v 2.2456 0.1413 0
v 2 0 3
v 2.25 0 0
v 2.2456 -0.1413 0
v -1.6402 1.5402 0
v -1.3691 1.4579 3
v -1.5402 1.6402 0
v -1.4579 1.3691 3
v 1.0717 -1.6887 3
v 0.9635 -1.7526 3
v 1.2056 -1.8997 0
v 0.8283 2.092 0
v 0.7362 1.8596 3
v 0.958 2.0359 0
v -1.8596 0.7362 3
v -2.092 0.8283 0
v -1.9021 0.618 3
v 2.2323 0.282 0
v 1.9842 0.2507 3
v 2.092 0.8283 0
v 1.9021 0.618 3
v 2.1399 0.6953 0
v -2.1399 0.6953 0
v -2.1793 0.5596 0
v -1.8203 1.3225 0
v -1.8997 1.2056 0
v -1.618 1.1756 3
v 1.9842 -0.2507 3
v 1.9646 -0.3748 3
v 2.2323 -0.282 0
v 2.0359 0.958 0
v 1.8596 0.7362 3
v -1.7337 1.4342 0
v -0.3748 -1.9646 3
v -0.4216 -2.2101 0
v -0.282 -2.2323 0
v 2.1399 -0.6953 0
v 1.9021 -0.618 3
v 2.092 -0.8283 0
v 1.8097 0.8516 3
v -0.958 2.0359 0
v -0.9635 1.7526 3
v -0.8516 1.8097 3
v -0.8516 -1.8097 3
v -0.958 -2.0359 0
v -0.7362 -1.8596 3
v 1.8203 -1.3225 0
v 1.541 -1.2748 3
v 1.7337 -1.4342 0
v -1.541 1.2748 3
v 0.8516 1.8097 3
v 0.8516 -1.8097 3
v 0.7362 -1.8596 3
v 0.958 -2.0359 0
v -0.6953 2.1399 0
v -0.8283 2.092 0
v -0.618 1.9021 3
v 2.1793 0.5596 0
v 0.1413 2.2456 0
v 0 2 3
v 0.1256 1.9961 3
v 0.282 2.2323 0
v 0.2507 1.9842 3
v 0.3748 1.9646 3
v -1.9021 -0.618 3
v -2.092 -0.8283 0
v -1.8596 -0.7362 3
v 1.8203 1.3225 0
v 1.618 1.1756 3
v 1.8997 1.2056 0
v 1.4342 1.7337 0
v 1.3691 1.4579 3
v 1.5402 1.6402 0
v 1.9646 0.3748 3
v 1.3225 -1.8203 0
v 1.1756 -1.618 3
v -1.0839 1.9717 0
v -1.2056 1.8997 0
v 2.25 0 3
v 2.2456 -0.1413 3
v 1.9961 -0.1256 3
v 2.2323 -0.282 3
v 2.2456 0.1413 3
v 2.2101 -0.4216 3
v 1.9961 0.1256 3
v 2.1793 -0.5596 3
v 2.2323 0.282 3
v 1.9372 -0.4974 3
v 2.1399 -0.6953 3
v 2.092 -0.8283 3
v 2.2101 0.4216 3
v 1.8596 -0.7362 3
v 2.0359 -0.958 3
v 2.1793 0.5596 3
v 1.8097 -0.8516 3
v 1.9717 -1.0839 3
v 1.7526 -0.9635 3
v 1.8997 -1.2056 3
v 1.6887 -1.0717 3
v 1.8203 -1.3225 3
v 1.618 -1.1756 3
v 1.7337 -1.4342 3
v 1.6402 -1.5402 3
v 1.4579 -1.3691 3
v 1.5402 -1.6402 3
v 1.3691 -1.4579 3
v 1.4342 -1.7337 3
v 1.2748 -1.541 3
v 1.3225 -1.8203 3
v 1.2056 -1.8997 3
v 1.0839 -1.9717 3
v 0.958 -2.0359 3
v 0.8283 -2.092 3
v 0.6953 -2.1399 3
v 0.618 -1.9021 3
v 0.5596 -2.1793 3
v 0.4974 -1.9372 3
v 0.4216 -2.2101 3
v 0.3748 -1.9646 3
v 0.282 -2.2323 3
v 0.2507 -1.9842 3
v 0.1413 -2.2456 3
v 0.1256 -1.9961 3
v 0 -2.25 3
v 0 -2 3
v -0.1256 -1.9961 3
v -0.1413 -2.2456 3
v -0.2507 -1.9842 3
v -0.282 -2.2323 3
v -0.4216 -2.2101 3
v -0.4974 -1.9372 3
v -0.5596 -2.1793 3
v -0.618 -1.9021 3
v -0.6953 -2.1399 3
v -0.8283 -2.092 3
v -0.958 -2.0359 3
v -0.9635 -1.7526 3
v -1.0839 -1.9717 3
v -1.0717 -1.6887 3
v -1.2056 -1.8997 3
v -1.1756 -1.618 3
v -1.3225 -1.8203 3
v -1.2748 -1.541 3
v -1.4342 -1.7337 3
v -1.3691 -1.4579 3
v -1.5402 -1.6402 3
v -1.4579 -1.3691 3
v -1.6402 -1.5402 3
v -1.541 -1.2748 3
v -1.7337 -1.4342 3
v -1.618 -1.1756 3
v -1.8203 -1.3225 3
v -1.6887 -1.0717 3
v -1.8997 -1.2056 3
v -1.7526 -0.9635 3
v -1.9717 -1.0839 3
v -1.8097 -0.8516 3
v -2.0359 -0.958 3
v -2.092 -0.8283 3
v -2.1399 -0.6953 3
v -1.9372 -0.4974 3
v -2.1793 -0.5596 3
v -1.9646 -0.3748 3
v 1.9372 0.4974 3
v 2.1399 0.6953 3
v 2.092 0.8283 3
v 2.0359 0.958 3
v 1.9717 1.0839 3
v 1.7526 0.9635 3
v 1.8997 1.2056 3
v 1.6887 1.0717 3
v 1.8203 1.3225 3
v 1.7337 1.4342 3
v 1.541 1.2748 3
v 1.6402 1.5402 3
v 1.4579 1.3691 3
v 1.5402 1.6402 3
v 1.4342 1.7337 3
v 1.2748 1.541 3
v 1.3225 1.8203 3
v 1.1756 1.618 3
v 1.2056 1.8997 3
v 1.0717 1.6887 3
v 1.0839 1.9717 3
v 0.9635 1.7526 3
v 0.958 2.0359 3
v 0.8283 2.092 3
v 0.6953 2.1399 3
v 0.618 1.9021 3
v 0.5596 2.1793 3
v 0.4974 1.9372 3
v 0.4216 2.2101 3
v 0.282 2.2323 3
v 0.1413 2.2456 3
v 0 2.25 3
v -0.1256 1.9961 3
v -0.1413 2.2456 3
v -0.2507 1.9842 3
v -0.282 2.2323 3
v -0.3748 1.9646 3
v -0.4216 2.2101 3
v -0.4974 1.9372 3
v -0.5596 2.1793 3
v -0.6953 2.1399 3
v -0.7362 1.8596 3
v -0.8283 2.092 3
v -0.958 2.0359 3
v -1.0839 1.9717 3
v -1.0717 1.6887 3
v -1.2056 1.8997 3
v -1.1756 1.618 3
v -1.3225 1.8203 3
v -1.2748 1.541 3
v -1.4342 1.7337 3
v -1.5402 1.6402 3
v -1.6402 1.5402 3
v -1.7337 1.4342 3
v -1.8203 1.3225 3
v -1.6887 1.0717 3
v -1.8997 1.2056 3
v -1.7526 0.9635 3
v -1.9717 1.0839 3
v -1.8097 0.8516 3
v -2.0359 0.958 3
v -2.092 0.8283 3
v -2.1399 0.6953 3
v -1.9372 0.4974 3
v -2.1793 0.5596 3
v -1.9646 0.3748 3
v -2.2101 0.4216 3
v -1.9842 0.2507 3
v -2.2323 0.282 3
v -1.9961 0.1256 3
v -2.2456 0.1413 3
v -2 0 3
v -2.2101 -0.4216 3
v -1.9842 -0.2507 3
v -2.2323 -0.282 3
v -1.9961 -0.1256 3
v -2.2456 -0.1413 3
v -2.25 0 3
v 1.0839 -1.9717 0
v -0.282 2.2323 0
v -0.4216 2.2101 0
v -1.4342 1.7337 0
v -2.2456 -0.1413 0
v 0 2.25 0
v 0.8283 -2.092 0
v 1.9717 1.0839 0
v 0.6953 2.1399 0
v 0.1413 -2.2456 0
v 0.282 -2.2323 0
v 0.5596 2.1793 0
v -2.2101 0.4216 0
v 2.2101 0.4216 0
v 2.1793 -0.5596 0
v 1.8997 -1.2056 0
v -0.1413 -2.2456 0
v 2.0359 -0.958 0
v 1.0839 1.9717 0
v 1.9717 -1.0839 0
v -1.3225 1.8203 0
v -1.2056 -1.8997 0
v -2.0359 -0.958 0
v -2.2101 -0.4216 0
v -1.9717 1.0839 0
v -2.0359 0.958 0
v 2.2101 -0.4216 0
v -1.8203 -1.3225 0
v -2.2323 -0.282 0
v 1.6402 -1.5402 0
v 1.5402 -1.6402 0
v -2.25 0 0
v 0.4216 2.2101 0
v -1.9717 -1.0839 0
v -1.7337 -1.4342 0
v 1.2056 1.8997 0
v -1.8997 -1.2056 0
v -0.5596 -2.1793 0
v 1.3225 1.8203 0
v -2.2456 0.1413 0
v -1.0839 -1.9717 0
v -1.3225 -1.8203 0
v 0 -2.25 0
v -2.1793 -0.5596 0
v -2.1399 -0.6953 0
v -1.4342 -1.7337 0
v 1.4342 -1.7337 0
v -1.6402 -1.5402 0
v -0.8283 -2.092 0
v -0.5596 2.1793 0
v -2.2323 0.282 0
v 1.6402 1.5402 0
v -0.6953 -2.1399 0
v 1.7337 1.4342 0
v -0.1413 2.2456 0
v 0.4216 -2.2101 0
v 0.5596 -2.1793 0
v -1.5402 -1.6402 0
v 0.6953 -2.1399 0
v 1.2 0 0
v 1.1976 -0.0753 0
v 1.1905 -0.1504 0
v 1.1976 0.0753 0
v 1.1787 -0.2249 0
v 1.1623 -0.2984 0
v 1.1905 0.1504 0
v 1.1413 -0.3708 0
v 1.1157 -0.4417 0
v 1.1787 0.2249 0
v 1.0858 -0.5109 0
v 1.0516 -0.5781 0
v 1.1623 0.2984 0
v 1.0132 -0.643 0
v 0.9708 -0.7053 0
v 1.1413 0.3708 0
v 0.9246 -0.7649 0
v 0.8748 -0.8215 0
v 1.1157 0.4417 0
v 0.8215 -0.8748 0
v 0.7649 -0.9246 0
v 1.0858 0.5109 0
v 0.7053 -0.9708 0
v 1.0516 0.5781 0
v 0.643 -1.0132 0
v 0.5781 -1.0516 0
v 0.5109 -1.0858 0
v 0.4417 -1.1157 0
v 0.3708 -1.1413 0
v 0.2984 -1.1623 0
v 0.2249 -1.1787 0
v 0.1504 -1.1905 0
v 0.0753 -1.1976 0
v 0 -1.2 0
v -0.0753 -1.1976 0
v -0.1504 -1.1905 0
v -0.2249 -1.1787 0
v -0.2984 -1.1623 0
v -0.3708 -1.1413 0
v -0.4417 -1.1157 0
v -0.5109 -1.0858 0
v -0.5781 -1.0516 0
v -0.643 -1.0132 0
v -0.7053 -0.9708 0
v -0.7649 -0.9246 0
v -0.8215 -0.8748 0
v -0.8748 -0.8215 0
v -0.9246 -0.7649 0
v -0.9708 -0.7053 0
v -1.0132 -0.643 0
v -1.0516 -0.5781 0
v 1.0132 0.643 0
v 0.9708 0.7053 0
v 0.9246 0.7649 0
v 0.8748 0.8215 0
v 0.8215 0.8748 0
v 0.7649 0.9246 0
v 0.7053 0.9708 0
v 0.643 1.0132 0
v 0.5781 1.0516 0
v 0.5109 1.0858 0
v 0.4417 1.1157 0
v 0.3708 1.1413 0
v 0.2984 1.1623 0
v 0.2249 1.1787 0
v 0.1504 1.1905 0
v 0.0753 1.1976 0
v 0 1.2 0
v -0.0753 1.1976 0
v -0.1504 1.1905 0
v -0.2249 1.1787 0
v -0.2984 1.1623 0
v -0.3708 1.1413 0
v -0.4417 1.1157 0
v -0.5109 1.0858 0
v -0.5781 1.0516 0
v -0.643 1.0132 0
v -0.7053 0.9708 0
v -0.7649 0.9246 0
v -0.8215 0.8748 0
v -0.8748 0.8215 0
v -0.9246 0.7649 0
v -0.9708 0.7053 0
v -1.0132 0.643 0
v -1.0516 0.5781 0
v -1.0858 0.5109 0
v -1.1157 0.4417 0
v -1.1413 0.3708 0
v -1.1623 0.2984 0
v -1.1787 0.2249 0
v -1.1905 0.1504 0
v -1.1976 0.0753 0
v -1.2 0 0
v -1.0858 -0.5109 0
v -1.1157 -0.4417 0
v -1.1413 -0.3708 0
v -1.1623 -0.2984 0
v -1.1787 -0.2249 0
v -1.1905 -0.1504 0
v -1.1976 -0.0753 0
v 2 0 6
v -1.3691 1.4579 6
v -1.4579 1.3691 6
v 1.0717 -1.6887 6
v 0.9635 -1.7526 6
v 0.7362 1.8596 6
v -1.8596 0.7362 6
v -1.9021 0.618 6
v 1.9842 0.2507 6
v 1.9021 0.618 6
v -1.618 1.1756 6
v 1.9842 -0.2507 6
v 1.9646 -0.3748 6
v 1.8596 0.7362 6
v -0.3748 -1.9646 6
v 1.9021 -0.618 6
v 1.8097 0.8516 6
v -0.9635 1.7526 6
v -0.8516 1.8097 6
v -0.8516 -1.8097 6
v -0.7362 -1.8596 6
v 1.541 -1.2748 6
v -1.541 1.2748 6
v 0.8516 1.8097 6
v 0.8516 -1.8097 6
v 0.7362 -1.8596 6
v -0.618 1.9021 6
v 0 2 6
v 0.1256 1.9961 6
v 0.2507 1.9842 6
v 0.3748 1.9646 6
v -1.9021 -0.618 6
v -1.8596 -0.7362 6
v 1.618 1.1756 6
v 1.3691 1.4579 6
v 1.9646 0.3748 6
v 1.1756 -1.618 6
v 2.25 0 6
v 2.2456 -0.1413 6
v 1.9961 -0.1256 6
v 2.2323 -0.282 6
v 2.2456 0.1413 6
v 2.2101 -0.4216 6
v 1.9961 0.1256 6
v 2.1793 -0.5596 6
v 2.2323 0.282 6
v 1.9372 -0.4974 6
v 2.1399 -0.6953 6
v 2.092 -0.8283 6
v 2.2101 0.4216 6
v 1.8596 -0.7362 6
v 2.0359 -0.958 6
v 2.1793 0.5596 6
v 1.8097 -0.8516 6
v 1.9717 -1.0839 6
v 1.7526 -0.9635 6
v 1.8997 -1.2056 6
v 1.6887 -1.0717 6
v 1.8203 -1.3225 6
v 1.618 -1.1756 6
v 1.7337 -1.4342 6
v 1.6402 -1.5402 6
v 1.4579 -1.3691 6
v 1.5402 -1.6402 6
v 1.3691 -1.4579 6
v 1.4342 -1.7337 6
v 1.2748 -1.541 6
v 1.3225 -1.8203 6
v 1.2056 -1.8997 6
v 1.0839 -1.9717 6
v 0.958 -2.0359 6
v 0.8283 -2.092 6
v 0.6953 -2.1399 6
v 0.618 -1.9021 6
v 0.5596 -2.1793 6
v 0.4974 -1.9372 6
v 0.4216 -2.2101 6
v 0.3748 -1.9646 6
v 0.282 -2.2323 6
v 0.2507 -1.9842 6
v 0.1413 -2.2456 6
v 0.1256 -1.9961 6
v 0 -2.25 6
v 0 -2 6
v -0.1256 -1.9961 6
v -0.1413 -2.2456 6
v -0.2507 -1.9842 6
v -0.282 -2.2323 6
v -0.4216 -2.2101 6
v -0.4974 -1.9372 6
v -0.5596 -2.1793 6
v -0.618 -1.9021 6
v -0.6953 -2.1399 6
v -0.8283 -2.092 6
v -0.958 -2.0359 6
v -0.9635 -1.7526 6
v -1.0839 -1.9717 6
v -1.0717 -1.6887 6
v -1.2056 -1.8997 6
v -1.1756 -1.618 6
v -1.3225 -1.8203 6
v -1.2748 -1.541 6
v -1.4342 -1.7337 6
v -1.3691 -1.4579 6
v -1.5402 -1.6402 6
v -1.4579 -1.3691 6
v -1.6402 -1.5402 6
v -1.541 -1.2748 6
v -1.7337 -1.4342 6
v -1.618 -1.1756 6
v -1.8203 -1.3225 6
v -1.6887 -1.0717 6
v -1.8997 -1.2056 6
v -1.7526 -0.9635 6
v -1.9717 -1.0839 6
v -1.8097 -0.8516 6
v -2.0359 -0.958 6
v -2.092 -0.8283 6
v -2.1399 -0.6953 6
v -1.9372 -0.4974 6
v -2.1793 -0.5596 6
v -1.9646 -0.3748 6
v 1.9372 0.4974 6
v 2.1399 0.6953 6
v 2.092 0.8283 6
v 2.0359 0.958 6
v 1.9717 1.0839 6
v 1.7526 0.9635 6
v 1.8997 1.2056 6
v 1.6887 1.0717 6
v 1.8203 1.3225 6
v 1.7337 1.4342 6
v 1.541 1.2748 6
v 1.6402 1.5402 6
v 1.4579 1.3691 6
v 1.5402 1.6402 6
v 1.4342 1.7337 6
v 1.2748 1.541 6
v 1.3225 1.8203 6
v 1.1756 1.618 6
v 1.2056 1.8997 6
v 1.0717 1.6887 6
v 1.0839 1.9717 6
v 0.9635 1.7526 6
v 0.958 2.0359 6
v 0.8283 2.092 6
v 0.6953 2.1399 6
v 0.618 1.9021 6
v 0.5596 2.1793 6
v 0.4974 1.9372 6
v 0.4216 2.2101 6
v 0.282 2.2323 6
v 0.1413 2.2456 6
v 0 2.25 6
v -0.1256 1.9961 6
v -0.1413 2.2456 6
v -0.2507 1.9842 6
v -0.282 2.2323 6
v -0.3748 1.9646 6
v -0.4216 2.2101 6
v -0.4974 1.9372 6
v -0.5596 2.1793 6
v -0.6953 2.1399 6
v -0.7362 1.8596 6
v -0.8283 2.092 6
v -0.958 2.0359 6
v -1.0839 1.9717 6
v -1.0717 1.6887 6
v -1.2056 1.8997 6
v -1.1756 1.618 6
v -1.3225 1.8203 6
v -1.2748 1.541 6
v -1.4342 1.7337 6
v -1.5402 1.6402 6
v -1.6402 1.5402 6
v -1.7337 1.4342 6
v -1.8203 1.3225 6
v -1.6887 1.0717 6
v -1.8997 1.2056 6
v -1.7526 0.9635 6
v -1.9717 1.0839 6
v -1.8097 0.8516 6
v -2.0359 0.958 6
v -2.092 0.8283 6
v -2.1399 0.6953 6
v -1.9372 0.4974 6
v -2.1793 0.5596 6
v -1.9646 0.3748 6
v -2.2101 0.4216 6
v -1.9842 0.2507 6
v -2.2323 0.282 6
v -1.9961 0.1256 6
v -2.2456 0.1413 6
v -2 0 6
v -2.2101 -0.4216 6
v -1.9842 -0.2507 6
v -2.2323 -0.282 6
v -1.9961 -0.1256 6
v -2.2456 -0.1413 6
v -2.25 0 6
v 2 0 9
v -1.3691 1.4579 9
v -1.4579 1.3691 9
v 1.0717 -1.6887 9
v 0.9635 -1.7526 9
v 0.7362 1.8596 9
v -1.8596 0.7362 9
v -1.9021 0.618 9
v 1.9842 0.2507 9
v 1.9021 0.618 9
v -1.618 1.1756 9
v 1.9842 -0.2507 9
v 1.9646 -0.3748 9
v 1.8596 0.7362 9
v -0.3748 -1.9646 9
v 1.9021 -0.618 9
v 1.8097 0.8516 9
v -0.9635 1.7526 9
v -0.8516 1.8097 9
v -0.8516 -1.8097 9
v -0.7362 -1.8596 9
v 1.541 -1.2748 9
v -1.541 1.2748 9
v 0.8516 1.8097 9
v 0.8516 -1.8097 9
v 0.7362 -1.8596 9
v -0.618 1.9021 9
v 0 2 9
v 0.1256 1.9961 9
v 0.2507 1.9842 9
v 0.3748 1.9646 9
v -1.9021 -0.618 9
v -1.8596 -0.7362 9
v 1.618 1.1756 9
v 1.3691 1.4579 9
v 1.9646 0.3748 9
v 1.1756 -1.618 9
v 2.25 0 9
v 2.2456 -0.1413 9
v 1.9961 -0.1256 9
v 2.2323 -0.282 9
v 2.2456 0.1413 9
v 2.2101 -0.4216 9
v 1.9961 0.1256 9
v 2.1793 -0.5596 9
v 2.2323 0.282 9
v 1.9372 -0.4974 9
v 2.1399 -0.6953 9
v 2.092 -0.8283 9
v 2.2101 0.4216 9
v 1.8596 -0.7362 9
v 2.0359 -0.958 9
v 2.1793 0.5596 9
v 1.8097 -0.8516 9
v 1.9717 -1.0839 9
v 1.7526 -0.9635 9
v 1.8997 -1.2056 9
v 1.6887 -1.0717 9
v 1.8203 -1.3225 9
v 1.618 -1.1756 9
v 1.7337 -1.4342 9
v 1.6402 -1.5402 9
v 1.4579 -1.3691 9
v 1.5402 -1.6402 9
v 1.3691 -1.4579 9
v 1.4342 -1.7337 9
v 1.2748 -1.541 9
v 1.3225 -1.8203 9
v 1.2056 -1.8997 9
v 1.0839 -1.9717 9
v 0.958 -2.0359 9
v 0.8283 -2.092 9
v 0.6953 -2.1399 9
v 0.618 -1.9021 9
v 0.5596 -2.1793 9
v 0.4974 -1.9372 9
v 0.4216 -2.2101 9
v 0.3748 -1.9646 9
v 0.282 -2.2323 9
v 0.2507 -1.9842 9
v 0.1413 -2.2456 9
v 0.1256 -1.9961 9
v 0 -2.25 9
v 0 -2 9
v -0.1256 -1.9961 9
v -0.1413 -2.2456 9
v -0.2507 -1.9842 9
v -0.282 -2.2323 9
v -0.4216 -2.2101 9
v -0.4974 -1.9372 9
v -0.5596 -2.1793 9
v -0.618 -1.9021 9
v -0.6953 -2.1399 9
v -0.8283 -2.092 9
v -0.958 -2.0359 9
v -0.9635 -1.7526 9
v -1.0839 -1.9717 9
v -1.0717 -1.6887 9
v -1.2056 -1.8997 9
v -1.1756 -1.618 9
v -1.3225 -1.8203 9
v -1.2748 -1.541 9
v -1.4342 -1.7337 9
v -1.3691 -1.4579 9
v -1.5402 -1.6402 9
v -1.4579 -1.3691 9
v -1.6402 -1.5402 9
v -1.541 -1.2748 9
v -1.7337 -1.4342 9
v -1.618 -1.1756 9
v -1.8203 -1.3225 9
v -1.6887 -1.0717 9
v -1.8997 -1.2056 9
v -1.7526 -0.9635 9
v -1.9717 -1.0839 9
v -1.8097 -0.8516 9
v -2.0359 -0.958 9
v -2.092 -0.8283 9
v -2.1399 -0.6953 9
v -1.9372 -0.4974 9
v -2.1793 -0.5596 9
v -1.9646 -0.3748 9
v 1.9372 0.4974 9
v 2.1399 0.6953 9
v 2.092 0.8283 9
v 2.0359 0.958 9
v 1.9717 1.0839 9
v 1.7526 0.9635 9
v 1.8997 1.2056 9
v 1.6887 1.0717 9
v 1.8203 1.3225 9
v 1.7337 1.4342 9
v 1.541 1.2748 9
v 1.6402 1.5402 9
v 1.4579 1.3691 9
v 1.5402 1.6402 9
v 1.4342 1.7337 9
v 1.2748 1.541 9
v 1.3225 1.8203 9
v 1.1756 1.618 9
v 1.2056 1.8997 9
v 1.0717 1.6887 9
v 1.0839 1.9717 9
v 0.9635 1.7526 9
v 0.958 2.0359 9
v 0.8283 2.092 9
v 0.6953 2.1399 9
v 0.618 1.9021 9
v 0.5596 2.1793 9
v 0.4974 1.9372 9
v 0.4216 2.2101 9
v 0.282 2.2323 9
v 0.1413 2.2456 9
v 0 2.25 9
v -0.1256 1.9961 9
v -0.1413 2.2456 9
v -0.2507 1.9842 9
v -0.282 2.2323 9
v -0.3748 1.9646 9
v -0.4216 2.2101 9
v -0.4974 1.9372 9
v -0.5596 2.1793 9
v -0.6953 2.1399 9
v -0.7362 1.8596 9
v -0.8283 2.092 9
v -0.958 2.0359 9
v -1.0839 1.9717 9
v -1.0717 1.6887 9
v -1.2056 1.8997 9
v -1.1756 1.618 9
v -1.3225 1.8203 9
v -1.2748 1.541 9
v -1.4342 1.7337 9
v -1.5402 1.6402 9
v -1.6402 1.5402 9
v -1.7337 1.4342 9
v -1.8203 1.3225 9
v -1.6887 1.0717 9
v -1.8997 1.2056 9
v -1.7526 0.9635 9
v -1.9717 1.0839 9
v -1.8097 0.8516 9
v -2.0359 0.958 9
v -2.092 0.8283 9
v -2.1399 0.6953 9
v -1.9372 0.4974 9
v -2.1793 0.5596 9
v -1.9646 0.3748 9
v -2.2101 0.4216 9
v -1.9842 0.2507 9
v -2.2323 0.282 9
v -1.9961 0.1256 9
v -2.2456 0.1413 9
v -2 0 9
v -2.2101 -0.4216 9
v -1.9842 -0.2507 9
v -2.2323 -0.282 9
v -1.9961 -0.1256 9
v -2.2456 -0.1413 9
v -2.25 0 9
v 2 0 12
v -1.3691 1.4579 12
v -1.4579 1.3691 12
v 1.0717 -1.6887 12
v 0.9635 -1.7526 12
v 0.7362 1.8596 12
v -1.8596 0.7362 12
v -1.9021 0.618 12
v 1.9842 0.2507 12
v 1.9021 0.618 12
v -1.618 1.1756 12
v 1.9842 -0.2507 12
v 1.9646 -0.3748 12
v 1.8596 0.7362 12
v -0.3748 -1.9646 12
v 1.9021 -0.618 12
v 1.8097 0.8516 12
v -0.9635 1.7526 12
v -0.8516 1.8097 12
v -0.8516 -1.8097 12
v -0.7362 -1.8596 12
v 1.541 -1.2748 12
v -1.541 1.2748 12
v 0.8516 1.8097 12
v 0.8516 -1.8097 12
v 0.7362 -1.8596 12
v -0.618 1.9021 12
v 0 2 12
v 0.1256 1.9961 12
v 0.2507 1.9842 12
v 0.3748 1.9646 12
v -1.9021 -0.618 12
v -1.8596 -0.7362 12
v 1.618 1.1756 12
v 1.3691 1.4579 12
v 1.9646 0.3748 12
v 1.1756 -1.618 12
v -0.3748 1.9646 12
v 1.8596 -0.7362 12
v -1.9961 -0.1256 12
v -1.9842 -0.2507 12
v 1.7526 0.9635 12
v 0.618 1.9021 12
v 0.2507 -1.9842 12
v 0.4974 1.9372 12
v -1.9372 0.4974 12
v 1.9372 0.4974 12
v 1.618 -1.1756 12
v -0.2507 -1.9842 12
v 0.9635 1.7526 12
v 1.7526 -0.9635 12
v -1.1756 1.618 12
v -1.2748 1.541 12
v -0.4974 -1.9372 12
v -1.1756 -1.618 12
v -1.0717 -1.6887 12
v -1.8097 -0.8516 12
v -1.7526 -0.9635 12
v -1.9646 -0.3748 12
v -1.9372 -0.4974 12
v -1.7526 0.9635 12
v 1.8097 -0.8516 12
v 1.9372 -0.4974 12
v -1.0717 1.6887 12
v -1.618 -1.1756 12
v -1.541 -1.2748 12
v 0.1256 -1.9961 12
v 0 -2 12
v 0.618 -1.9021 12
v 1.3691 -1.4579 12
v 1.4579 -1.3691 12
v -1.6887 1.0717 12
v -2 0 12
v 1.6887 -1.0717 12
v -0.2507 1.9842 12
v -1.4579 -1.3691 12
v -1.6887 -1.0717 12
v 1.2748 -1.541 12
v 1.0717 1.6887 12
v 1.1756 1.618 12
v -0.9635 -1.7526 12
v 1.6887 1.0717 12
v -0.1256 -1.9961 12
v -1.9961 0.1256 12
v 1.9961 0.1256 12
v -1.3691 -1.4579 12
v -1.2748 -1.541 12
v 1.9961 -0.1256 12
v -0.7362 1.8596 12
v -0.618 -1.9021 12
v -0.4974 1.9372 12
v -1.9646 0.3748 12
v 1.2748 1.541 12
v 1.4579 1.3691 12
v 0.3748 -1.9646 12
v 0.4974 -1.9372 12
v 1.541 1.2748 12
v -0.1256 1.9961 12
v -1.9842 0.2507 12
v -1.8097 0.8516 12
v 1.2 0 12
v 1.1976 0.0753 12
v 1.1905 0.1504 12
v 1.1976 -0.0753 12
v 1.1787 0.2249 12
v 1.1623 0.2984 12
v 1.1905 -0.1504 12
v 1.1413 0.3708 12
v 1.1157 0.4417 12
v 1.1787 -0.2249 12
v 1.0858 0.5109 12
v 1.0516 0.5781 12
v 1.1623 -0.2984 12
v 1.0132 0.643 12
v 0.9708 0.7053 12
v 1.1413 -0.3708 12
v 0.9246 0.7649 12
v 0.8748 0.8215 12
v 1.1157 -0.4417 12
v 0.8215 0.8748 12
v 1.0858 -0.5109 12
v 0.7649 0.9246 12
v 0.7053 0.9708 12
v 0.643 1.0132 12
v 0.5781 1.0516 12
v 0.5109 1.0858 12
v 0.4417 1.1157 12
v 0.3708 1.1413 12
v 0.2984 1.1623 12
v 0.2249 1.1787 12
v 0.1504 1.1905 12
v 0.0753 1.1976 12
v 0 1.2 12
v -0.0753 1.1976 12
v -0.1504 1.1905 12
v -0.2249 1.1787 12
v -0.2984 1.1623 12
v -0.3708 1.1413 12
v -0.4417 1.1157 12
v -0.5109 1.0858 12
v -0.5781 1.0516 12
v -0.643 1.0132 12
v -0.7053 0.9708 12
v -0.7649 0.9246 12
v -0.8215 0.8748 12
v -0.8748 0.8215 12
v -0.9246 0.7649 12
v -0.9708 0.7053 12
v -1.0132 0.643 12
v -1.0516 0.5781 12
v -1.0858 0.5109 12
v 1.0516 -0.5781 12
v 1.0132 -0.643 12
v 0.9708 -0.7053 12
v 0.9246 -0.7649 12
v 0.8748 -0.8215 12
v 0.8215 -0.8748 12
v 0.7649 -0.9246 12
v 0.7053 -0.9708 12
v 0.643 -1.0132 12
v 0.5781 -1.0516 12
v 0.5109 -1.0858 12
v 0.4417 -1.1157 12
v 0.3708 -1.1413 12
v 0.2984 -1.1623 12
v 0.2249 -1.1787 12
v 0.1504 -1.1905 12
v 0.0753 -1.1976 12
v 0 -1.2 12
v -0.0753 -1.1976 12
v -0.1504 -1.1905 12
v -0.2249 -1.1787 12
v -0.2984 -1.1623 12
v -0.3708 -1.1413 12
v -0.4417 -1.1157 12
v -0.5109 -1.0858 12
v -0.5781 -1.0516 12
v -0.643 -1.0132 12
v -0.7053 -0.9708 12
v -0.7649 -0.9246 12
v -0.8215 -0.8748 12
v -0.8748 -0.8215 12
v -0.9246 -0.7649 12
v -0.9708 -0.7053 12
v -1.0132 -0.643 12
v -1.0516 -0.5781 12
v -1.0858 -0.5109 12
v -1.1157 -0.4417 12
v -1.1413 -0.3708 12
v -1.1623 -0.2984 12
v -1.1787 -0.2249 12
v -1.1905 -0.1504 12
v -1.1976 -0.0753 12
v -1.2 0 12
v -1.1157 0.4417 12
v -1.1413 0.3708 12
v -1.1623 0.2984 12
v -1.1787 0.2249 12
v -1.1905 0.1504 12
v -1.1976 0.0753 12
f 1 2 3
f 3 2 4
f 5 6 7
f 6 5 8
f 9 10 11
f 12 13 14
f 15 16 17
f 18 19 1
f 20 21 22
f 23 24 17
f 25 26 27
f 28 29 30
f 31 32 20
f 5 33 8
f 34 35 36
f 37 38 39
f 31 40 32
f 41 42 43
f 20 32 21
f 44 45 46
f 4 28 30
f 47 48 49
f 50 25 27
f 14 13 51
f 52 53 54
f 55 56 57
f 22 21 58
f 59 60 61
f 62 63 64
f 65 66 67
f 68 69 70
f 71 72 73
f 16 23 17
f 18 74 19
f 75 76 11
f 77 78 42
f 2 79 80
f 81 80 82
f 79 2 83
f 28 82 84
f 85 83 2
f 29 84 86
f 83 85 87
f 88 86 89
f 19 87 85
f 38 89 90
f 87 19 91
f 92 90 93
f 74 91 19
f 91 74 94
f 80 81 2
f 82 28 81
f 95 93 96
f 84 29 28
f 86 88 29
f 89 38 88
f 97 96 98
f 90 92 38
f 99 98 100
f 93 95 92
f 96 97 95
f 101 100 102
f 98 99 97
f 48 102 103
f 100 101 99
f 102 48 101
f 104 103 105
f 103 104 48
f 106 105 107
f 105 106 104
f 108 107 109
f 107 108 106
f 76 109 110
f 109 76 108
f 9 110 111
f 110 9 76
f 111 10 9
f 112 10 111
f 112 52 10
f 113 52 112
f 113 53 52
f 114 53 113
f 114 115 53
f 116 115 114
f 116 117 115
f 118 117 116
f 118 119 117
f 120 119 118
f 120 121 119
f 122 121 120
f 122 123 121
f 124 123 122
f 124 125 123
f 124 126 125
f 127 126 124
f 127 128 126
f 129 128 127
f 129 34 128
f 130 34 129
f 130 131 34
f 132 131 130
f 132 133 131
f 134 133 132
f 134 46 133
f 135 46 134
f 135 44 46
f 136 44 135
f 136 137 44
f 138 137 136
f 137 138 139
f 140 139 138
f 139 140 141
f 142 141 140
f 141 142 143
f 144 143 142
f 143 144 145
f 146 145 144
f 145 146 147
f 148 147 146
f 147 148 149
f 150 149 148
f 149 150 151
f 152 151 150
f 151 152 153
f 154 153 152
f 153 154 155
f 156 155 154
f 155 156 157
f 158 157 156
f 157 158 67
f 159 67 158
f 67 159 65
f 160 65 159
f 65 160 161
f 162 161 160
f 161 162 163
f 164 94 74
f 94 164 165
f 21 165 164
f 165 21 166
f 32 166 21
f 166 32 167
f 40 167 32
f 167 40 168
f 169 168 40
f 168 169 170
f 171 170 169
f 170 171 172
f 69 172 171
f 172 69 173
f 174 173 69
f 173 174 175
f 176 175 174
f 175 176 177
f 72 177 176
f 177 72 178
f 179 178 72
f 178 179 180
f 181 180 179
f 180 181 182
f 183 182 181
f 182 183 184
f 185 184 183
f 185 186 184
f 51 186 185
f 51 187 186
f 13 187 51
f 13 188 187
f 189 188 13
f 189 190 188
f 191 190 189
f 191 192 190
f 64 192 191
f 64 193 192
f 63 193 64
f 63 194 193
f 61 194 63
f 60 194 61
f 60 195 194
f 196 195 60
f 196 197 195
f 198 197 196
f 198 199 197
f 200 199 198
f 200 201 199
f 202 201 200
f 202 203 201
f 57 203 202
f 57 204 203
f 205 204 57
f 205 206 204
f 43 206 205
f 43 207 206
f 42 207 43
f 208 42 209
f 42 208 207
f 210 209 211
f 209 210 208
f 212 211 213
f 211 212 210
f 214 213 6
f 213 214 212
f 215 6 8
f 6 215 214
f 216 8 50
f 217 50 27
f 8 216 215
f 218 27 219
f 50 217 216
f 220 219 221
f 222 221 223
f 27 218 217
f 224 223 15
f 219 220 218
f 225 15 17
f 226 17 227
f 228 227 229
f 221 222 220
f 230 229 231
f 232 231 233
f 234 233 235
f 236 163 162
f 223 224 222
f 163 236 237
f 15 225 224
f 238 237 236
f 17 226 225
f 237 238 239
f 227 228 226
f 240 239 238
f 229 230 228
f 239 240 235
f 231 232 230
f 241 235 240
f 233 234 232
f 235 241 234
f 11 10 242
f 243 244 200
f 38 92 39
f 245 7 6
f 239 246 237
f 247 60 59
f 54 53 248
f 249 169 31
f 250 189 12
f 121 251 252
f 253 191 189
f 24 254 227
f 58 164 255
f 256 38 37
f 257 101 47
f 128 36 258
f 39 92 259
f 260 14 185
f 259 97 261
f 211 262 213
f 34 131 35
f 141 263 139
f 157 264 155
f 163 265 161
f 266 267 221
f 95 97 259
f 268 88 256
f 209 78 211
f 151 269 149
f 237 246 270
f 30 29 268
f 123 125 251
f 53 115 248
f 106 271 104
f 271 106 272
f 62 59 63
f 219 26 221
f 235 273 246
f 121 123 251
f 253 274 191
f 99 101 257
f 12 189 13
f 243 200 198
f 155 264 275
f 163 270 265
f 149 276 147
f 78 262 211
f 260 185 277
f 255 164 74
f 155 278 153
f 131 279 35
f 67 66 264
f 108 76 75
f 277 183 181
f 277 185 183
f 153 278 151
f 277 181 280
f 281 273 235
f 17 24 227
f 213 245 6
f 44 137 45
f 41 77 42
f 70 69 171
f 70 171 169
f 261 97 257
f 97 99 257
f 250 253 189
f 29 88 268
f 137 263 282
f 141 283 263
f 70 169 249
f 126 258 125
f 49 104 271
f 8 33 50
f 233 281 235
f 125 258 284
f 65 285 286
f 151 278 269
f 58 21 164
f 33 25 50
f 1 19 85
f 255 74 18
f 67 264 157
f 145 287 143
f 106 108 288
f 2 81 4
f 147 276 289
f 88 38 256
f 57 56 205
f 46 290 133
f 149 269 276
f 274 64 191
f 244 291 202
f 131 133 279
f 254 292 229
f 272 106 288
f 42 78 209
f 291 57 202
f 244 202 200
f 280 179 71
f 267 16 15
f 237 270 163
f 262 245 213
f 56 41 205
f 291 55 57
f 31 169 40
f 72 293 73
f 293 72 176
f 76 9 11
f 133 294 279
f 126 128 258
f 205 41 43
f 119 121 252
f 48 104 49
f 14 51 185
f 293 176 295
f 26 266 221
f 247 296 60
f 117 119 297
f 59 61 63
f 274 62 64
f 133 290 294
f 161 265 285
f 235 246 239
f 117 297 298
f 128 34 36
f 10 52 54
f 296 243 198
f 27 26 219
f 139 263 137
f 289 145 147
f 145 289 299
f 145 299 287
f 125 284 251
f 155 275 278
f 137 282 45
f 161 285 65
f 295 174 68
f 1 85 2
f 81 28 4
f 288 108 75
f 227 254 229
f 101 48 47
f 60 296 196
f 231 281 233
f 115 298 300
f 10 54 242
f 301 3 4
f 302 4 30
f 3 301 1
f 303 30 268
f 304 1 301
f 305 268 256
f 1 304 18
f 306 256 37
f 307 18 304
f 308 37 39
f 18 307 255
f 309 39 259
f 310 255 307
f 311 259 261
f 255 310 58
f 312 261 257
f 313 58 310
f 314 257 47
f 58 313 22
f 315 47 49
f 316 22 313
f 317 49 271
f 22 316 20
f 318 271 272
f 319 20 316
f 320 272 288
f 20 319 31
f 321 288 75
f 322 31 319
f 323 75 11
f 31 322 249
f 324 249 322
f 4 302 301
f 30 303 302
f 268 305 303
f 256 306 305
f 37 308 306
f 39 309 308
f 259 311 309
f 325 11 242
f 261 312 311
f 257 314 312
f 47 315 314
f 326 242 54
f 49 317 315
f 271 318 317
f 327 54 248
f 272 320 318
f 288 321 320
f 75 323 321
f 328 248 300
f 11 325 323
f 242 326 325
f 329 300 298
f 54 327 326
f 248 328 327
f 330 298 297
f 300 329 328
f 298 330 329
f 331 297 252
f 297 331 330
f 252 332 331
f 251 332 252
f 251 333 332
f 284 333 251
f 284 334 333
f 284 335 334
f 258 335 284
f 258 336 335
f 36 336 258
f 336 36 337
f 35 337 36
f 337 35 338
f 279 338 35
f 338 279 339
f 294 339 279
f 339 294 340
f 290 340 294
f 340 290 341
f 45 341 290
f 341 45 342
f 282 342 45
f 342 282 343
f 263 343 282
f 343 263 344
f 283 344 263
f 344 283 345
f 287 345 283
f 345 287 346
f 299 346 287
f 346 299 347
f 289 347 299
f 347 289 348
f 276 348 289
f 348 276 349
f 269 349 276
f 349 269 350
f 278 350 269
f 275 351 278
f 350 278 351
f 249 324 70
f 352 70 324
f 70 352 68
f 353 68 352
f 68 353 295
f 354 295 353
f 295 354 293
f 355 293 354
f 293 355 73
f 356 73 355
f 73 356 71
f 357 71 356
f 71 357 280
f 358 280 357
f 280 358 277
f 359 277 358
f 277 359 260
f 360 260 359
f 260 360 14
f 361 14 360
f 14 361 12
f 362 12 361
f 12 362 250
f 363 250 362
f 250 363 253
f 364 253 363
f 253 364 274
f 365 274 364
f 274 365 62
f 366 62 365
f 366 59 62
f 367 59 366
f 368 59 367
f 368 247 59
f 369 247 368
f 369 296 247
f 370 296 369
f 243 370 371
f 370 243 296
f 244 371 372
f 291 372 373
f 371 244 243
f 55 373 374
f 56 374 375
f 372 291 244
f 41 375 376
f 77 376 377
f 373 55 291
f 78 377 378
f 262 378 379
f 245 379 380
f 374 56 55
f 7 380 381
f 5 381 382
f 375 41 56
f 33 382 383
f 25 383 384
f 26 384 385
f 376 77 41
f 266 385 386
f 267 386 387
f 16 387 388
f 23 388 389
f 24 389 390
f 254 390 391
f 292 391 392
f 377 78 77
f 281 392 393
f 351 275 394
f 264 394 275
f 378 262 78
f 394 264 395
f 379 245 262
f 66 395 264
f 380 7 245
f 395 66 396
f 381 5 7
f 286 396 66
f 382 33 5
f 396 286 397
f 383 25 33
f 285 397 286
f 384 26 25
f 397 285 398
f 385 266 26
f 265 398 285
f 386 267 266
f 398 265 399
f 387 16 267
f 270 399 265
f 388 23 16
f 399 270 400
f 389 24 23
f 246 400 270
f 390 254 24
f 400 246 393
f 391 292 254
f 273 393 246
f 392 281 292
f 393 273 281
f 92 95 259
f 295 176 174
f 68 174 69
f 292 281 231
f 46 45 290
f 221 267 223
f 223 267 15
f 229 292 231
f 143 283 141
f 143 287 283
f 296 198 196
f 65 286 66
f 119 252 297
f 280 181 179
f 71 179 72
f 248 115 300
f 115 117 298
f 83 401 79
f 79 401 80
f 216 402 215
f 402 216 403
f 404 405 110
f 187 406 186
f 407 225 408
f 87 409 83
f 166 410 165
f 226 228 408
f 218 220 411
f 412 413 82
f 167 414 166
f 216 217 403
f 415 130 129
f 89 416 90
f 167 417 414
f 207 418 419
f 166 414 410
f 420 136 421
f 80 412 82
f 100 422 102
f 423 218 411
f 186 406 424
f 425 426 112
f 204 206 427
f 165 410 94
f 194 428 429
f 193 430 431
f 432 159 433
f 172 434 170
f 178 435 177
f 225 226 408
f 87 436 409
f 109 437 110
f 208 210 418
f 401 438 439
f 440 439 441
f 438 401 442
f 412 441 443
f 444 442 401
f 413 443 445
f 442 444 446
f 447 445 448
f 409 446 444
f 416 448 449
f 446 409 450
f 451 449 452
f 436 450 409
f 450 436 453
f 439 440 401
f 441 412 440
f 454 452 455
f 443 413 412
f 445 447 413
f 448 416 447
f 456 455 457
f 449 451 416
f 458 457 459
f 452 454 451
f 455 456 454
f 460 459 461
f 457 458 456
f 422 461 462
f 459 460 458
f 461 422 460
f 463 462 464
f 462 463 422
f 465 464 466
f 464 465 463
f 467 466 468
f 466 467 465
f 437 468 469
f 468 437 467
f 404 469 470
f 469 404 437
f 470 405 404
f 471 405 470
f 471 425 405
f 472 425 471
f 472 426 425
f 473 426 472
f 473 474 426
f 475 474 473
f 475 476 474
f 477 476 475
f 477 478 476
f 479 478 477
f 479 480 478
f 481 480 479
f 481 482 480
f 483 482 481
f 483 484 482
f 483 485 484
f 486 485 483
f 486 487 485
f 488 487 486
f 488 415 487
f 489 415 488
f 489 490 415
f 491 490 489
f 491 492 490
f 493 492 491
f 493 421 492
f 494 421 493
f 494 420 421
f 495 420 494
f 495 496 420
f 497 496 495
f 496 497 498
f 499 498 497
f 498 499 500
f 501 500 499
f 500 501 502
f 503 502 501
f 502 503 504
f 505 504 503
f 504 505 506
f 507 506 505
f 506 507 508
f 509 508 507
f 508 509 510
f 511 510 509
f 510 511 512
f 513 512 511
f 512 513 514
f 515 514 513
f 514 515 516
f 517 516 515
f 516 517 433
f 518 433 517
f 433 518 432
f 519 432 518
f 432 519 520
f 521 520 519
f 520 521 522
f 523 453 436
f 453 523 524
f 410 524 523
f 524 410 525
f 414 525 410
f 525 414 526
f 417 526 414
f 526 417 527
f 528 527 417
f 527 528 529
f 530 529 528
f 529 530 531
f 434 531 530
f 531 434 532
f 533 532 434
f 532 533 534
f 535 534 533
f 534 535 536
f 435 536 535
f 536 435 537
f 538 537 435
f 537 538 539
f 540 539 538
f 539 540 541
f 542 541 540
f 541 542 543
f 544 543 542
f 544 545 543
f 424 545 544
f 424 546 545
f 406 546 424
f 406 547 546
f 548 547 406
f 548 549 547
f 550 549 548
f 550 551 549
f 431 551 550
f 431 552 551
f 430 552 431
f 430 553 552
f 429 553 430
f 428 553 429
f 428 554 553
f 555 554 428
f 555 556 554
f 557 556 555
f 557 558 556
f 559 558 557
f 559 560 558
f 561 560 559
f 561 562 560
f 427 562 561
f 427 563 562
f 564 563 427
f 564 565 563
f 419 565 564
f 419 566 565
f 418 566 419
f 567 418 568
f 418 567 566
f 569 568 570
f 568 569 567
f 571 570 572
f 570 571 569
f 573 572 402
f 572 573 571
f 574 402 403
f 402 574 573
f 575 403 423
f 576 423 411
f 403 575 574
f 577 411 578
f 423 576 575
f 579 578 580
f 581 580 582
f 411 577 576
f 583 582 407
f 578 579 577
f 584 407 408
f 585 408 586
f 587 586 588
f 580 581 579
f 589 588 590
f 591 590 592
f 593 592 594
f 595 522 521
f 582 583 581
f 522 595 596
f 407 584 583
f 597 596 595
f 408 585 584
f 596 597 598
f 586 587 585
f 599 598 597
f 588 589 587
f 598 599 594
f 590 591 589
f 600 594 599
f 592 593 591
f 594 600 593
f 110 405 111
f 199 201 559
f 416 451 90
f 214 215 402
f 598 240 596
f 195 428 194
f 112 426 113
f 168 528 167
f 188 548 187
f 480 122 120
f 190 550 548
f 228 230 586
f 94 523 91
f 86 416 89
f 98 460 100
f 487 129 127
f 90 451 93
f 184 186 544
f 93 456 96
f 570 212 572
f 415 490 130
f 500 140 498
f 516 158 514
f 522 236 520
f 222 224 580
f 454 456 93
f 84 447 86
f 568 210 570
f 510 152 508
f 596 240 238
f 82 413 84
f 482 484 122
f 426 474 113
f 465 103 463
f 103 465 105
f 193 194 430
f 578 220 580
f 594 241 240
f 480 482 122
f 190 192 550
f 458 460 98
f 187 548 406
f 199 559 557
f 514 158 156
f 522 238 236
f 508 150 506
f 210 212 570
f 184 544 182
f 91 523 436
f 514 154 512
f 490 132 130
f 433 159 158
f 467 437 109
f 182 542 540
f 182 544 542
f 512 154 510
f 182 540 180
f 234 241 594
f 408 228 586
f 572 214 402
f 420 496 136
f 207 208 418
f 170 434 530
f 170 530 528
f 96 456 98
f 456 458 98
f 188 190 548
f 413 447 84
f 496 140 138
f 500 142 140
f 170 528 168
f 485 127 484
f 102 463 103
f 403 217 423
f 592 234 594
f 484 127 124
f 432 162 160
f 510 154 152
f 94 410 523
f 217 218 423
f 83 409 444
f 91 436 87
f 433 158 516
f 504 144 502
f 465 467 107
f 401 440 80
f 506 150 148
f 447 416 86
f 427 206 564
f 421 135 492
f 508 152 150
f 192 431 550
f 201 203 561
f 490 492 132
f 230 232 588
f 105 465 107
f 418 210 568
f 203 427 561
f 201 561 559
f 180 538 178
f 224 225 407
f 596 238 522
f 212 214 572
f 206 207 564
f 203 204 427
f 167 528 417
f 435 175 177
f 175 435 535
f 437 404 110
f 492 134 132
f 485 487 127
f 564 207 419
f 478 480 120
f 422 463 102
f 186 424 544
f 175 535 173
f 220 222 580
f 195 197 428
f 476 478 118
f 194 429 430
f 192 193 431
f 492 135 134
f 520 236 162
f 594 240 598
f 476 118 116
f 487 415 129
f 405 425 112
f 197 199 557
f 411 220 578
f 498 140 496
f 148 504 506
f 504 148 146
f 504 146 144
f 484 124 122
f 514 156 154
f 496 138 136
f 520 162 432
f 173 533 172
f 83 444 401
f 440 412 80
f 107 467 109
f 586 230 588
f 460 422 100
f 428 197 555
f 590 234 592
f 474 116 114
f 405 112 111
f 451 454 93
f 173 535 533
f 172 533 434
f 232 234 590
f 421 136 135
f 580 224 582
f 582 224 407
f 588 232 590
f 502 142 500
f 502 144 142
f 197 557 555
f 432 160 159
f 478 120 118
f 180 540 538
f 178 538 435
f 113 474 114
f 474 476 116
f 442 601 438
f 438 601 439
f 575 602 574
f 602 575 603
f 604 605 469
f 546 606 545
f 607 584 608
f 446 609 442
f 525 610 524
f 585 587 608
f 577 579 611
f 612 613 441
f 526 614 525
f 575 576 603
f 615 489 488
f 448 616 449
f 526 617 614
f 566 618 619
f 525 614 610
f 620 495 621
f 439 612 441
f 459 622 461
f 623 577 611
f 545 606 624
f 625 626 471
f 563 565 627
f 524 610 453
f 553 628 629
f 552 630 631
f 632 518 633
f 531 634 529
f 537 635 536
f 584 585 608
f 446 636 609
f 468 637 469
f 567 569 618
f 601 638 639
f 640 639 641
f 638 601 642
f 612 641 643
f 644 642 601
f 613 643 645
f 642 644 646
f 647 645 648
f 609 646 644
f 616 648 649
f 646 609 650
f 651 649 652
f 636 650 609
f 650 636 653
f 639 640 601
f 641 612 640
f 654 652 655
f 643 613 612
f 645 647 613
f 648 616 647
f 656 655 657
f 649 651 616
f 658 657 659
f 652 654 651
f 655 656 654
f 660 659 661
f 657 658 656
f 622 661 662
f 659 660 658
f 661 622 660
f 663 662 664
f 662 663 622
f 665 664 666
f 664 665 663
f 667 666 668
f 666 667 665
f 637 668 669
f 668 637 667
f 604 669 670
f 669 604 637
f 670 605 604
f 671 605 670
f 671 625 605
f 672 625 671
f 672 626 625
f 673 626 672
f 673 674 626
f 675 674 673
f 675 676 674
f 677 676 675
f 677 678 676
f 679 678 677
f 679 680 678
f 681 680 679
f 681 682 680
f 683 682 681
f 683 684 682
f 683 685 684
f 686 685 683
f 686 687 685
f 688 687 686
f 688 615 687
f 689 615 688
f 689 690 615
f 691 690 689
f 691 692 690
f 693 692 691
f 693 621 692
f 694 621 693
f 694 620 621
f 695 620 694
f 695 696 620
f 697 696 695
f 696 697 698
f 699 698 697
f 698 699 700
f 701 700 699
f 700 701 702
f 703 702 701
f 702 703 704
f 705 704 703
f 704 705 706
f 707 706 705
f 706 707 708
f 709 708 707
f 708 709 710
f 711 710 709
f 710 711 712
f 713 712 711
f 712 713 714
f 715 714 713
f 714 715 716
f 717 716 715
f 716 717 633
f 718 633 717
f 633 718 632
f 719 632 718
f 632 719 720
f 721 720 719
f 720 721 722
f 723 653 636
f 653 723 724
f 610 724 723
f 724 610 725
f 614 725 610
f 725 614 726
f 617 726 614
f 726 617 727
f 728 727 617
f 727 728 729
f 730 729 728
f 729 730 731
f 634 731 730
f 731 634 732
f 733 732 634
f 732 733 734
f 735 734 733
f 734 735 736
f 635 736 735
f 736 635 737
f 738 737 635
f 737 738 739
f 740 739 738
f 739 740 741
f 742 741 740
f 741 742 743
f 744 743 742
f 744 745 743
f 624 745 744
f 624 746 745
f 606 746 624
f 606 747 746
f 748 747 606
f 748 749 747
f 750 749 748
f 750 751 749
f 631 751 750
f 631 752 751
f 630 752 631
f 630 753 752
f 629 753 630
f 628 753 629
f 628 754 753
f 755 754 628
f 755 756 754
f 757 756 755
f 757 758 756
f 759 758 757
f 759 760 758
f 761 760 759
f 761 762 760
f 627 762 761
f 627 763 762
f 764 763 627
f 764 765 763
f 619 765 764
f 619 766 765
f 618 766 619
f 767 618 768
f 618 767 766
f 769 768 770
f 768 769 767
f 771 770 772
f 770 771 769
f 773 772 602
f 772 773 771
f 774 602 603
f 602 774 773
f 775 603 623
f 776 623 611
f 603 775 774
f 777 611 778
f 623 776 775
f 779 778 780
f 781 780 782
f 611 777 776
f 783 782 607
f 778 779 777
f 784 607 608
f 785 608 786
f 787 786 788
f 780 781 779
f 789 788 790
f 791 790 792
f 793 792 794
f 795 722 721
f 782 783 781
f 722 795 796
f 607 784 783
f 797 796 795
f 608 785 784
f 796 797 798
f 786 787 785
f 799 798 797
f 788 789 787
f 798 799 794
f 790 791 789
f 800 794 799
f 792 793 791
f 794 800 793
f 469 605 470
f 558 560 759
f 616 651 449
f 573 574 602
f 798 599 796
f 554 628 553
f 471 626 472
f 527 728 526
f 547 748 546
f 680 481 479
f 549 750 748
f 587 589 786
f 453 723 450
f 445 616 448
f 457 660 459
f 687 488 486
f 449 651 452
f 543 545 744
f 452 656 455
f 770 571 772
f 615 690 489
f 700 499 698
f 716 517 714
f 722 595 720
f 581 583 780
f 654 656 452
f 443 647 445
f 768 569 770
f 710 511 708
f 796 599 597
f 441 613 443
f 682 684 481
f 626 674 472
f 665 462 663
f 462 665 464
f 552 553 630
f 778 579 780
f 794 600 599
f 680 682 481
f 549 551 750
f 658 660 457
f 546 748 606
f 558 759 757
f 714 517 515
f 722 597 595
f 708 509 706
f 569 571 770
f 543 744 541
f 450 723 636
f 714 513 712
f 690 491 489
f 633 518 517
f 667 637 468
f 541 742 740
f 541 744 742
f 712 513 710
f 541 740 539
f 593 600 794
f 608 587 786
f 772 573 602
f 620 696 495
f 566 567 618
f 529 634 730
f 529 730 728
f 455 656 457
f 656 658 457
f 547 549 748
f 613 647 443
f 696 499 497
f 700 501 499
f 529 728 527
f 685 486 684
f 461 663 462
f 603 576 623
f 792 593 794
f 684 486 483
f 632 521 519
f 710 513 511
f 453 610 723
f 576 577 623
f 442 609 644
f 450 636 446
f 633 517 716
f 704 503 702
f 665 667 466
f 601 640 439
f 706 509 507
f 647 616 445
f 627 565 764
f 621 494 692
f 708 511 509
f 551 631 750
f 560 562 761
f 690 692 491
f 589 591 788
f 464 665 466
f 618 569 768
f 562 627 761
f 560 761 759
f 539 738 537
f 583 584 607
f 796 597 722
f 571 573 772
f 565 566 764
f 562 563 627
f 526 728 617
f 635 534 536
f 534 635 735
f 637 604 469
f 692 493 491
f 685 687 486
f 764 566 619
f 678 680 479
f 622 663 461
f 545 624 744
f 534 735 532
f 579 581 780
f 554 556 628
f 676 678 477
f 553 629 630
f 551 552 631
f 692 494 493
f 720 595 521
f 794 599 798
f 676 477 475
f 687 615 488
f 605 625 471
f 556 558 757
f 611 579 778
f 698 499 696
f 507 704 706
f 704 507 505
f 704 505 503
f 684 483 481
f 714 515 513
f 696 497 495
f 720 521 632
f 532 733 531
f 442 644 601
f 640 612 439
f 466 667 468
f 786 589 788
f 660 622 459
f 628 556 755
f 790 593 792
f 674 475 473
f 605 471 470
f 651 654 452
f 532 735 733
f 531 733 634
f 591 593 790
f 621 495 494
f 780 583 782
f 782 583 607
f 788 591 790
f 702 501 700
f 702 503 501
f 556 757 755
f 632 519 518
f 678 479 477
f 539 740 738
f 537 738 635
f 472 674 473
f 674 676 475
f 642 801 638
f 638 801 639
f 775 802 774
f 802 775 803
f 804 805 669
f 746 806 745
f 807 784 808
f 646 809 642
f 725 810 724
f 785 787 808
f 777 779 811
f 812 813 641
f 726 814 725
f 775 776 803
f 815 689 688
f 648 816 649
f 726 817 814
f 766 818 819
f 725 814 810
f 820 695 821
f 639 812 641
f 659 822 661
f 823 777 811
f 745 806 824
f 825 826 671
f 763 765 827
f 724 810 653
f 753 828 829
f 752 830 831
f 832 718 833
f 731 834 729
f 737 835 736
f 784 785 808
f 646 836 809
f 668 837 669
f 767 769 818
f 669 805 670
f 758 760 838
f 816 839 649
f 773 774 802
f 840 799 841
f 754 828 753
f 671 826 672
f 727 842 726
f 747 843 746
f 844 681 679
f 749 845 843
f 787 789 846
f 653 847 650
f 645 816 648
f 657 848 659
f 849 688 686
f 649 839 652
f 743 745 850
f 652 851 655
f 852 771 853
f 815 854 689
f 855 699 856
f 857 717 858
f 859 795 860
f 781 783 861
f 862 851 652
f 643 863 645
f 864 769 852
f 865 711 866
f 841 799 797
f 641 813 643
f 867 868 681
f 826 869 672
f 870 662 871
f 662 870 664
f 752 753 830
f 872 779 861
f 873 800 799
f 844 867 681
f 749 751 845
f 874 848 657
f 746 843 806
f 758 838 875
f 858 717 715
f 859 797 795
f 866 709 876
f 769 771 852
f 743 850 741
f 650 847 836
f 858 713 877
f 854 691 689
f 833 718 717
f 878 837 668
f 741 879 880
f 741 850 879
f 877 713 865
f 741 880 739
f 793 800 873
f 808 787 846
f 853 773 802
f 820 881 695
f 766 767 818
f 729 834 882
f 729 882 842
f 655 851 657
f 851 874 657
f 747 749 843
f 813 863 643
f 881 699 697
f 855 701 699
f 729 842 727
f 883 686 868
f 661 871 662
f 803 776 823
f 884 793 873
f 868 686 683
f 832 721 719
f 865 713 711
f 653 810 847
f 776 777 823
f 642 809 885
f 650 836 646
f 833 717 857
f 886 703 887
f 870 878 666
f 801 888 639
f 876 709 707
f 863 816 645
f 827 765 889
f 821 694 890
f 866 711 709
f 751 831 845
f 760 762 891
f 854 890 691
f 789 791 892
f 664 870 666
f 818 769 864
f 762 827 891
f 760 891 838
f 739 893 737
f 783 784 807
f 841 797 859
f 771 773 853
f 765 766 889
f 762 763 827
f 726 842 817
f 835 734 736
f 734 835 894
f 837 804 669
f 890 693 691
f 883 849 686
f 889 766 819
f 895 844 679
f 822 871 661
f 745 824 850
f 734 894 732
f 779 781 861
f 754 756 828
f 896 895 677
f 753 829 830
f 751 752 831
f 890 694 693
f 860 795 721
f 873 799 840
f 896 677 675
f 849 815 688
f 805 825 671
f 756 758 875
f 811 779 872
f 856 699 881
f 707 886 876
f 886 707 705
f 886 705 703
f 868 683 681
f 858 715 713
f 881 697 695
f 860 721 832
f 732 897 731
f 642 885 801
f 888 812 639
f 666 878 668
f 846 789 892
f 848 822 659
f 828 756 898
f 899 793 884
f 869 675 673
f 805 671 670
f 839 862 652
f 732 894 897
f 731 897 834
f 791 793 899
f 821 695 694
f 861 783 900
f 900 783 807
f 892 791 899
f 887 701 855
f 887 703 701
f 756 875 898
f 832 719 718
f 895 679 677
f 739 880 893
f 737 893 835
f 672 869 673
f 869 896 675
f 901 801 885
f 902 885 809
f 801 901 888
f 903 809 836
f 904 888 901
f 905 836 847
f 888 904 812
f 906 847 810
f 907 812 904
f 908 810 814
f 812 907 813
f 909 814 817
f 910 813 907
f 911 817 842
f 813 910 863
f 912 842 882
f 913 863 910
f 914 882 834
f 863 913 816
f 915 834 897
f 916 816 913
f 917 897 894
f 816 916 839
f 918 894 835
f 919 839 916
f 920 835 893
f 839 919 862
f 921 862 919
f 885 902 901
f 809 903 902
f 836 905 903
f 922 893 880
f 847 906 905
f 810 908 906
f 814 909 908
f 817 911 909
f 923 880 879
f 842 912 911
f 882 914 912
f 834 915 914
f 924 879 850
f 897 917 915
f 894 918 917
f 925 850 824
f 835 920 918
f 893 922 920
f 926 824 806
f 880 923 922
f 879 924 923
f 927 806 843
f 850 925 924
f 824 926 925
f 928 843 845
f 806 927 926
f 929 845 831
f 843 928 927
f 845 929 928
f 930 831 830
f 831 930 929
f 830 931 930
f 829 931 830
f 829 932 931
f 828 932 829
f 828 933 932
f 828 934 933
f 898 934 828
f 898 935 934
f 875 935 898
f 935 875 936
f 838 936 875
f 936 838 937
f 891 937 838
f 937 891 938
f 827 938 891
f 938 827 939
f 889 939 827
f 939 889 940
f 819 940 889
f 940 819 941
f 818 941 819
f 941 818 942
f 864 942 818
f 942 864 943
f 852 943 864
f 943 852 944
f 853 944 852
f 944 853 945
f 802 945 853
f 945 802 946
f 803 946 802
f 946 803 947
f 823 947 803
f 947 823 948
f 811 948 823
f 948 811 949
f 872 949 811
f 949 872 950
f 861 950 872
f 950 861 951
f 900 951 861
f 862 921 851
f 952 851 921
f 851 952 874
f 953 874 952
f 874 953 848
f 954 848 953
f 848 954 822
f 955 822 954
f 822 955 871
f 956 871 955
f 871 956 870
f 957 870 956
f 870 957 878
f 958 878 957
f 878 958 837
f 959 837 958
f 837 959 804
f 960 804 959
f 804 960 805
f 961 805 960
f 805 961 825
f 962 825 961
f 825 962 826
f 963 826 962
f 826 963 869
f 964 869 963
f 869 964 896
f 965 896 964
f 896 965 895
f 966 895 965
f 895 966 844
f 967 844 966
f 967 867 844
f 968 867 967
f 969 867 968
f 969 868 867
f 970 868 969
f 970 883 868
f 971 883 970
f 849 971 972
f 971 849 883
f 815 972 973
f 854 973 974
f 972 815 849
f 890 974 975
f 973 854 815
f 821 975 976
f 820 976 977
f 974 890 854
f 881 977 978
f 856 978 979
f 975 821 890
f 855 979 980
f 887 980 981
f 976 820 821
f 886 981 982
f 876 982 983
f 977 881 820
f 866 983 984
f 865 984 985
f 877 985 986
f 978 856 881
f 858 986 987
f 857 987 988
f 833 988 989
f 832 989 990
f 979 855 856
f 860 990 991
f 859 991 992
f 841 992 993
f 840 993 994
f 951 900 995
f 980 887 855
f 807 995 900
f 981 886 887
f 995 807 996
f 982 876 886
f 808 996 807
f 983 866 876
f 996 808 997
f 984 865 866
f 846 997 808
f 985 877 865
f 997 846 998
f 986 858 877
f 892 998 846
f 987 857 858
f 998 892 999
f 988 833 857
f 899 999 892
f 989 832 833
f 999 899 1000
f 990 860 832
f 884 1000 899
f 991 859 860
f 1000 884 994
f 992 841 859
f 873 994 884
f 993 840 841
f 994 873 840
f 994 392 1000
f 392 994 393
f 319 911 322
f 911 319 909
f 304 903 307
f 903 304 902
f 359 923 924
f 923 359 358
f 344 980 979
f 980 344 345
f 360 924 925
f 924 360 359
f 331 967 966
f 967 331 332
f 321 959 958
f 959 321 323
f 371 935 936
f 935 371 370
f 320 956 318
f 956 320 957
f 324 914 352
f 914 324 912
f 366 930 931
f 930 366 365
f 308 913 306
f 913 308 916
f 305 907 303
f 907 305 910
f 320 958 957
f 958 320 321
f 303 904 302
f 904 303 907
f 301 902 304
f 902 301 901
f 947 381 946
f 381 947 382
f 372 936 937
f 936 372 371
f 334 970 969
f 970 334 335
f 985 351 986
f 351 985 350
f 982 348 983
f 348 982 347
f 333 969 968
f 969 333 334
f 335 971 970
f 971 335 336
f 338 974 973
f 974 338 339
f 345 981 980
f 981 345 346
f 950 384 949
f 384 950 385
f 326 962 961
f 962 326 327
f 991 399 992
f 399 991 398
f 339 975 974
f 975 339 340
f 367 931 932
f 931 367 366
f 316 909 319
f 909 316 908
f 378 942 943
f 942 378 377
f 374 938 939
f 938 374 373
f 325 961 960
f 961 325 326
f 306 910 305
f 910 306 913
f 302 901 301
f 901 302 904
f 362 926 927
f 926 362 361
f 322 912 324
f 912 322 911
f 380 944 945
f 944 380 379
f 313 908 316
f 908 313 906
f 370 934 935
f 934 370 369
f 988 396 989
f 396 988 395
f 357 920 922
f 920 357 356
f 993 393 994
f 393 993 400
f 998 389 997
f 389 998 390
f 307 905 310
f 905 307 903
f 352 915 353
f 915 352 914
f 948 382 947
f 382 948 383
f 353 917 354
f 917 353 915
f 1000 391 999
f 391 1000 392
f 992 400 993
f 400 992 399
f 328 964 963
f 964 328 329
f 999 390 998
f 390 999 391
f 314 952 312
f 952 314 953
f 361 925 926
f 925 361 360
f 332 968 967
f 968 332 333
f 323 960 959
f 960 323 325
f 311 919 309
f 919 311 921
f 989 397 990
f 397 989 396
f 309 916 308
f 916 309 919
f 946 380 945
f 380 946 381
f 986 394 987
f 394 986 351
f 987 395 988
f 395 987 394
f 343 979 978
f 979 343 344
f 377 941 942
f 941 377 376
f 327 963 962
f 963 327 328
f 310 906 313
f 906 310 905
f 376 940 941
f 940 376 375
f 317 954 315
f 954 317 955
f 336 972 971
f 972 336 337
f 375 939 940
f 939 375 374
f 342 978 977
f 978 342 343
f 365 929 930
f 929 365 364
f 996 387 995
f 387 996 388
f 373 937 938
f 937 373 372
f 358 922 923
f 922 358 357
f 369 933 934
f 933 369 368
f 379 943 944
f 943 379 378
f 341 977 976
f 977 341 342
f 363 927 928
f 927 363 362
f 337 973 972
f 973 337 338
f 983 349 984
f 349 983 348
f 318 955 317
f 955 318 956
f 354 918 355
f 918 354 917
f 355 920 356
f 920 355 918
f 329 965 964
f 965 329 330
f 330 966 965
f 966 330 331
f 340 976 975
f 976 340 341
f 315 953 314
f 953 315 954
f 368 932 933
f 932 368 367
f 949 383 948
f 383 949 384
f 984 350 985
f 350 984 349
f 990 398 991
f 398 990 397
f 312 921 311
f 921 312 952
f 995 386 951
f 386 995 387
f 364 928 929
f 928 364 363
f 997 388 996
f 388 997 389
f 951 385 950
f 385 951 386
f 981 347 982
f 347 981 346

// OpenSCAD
// file: Parameters.scad
//
//  Parameters.scad
//  flower-box-hose-system
//
//  Author: Marius Montebaur
//  montebaur.tech, github.com/montioo
//

// 
// Parameterization for Hose Connectors.
// 
// This file holds the measures that are employed by all adapters. 
// Additional information is available here:
//  https://montebaur.tech/hose_connectors.html


// Parameters for 8mm x 1.5mm hoses
// (8mm inner diameter and the wall strength: 8mm + 2*1.5mm = 11mm diameter)
// ===============================================

// inner and outer diameter refer to the 3D printed connectors, NOT the hose.
hc8mm_pipe_inner_dia = 5.4;
hc8mm_pipe_outer_dia = 8;
hc8mm_outer_dia_lower = 7.75;
hc8mm_outer_dia_upper = 9;
hc8mm_tooth_length = 4.3;
hc8mm_tooth_number = 4;


// Parameters for 4mm x 1mm
// ===============================================

// inner and outer diameter refer to the 3D printed connectors, NOT the hose.
hc4mm_pipe_inner_dia = 2.4;
hc4mm_pipe_outer_dia = 4;
hc4mm_outer_dia_lower = 4;
hc4mm_outer_dia_upper = 4.5;
hc4mm_tooth_length = 3;
hc4mm_tooth_number = 4;


// Your custom parameters ...
// 1. Add your parameterization instead of dots (...)
// 2. Add the variables to the lists below
// 3. Index your parameters by index 2 in each list (the lists
//    are imported in file in this project).
// ===============================================

// hcXmm_pipe_inner_dia = ...;
// hcXmm_pipe_outer_dia = ...;
// hcXmm_outer_dia_lower = ...;
// hcXmm_outer_dia_upper = ...;
// hcXmm_tooth_length = ...;
// hcXmm_tooth_number = ...;


// These variables are available throughout the project (after using
// `include <Parameters.scad>`) and hold parameterizations for hoses
// with different diameters.
// A schematic for the parameters can be found here:
//   https://montebaur.tech/hose_connectors.html#parameterization
hc_pipe_inner_dia =  [hc4mm_pipe_inner_dia, hc8mm_pipe_inner_dia];  // a
hc_pipe_outer_dia =  [hc4mm_pipe_outer_dia, hc8mm_pipe_outer_dia];  // b
hc_outer_dia_lower = [hc4mm_outer_dia_lower, hc8mm_outer_dia_lower];  // c
hc_outer_dia_upper = [hc4mm_outer_dia_upper, hc8mm_outer_dia_upper];  // d
hc_tooth_length =    [hc4mm_tooth_length, hc8mm_tooth_length];  // e
hc_tooth_number =    [hc4mm_tooth_number, hc8mm_tooth_number];  // #teeth
// main file
//
//  HoseConnector.scad
//  flower-box-hose-system
//
//  Author: Marius Montebaur
//  montebaur.tech, github.com/montioo
//

include <Parameters.scad>

// set this to a lower value (e.g. 30) while editing.
$fn = 100;


// Model of the connector that fits into a tube.
// @param hose_type: Defines the type of hose this connector should fit into.
//   A list of hose indices along with a detailed explanation is given in Parameters.scad
//   Default is hose_type with id 0 (hoses with 4mm inner diameter).
module HoseConnector(hose_type=0) {
    difference() {
        for (i = [0 : hc_tooth_number[hose_type]-1]) {
            translate([0, 0, i*hc_tooth_length[hose_type]]) cylinder(
                h=hc_tooth_length[hose_type],
                d1=hc_outer_dia_upper[hose_type],
                d2=hc_outer_dia_lower[hose_type]
            );
        }
        translate([0, 0, -0.01]) cylinder(
            h=hc_tooth_number[hose_type] * hc_tooth_length[hose_type] + 2 * 0.01,
            d=hc_pipe_inner_dia[hose_type]
        );
    }
}

// Example for a connector modeled after hose_type 0:
HoseConnector(0);
